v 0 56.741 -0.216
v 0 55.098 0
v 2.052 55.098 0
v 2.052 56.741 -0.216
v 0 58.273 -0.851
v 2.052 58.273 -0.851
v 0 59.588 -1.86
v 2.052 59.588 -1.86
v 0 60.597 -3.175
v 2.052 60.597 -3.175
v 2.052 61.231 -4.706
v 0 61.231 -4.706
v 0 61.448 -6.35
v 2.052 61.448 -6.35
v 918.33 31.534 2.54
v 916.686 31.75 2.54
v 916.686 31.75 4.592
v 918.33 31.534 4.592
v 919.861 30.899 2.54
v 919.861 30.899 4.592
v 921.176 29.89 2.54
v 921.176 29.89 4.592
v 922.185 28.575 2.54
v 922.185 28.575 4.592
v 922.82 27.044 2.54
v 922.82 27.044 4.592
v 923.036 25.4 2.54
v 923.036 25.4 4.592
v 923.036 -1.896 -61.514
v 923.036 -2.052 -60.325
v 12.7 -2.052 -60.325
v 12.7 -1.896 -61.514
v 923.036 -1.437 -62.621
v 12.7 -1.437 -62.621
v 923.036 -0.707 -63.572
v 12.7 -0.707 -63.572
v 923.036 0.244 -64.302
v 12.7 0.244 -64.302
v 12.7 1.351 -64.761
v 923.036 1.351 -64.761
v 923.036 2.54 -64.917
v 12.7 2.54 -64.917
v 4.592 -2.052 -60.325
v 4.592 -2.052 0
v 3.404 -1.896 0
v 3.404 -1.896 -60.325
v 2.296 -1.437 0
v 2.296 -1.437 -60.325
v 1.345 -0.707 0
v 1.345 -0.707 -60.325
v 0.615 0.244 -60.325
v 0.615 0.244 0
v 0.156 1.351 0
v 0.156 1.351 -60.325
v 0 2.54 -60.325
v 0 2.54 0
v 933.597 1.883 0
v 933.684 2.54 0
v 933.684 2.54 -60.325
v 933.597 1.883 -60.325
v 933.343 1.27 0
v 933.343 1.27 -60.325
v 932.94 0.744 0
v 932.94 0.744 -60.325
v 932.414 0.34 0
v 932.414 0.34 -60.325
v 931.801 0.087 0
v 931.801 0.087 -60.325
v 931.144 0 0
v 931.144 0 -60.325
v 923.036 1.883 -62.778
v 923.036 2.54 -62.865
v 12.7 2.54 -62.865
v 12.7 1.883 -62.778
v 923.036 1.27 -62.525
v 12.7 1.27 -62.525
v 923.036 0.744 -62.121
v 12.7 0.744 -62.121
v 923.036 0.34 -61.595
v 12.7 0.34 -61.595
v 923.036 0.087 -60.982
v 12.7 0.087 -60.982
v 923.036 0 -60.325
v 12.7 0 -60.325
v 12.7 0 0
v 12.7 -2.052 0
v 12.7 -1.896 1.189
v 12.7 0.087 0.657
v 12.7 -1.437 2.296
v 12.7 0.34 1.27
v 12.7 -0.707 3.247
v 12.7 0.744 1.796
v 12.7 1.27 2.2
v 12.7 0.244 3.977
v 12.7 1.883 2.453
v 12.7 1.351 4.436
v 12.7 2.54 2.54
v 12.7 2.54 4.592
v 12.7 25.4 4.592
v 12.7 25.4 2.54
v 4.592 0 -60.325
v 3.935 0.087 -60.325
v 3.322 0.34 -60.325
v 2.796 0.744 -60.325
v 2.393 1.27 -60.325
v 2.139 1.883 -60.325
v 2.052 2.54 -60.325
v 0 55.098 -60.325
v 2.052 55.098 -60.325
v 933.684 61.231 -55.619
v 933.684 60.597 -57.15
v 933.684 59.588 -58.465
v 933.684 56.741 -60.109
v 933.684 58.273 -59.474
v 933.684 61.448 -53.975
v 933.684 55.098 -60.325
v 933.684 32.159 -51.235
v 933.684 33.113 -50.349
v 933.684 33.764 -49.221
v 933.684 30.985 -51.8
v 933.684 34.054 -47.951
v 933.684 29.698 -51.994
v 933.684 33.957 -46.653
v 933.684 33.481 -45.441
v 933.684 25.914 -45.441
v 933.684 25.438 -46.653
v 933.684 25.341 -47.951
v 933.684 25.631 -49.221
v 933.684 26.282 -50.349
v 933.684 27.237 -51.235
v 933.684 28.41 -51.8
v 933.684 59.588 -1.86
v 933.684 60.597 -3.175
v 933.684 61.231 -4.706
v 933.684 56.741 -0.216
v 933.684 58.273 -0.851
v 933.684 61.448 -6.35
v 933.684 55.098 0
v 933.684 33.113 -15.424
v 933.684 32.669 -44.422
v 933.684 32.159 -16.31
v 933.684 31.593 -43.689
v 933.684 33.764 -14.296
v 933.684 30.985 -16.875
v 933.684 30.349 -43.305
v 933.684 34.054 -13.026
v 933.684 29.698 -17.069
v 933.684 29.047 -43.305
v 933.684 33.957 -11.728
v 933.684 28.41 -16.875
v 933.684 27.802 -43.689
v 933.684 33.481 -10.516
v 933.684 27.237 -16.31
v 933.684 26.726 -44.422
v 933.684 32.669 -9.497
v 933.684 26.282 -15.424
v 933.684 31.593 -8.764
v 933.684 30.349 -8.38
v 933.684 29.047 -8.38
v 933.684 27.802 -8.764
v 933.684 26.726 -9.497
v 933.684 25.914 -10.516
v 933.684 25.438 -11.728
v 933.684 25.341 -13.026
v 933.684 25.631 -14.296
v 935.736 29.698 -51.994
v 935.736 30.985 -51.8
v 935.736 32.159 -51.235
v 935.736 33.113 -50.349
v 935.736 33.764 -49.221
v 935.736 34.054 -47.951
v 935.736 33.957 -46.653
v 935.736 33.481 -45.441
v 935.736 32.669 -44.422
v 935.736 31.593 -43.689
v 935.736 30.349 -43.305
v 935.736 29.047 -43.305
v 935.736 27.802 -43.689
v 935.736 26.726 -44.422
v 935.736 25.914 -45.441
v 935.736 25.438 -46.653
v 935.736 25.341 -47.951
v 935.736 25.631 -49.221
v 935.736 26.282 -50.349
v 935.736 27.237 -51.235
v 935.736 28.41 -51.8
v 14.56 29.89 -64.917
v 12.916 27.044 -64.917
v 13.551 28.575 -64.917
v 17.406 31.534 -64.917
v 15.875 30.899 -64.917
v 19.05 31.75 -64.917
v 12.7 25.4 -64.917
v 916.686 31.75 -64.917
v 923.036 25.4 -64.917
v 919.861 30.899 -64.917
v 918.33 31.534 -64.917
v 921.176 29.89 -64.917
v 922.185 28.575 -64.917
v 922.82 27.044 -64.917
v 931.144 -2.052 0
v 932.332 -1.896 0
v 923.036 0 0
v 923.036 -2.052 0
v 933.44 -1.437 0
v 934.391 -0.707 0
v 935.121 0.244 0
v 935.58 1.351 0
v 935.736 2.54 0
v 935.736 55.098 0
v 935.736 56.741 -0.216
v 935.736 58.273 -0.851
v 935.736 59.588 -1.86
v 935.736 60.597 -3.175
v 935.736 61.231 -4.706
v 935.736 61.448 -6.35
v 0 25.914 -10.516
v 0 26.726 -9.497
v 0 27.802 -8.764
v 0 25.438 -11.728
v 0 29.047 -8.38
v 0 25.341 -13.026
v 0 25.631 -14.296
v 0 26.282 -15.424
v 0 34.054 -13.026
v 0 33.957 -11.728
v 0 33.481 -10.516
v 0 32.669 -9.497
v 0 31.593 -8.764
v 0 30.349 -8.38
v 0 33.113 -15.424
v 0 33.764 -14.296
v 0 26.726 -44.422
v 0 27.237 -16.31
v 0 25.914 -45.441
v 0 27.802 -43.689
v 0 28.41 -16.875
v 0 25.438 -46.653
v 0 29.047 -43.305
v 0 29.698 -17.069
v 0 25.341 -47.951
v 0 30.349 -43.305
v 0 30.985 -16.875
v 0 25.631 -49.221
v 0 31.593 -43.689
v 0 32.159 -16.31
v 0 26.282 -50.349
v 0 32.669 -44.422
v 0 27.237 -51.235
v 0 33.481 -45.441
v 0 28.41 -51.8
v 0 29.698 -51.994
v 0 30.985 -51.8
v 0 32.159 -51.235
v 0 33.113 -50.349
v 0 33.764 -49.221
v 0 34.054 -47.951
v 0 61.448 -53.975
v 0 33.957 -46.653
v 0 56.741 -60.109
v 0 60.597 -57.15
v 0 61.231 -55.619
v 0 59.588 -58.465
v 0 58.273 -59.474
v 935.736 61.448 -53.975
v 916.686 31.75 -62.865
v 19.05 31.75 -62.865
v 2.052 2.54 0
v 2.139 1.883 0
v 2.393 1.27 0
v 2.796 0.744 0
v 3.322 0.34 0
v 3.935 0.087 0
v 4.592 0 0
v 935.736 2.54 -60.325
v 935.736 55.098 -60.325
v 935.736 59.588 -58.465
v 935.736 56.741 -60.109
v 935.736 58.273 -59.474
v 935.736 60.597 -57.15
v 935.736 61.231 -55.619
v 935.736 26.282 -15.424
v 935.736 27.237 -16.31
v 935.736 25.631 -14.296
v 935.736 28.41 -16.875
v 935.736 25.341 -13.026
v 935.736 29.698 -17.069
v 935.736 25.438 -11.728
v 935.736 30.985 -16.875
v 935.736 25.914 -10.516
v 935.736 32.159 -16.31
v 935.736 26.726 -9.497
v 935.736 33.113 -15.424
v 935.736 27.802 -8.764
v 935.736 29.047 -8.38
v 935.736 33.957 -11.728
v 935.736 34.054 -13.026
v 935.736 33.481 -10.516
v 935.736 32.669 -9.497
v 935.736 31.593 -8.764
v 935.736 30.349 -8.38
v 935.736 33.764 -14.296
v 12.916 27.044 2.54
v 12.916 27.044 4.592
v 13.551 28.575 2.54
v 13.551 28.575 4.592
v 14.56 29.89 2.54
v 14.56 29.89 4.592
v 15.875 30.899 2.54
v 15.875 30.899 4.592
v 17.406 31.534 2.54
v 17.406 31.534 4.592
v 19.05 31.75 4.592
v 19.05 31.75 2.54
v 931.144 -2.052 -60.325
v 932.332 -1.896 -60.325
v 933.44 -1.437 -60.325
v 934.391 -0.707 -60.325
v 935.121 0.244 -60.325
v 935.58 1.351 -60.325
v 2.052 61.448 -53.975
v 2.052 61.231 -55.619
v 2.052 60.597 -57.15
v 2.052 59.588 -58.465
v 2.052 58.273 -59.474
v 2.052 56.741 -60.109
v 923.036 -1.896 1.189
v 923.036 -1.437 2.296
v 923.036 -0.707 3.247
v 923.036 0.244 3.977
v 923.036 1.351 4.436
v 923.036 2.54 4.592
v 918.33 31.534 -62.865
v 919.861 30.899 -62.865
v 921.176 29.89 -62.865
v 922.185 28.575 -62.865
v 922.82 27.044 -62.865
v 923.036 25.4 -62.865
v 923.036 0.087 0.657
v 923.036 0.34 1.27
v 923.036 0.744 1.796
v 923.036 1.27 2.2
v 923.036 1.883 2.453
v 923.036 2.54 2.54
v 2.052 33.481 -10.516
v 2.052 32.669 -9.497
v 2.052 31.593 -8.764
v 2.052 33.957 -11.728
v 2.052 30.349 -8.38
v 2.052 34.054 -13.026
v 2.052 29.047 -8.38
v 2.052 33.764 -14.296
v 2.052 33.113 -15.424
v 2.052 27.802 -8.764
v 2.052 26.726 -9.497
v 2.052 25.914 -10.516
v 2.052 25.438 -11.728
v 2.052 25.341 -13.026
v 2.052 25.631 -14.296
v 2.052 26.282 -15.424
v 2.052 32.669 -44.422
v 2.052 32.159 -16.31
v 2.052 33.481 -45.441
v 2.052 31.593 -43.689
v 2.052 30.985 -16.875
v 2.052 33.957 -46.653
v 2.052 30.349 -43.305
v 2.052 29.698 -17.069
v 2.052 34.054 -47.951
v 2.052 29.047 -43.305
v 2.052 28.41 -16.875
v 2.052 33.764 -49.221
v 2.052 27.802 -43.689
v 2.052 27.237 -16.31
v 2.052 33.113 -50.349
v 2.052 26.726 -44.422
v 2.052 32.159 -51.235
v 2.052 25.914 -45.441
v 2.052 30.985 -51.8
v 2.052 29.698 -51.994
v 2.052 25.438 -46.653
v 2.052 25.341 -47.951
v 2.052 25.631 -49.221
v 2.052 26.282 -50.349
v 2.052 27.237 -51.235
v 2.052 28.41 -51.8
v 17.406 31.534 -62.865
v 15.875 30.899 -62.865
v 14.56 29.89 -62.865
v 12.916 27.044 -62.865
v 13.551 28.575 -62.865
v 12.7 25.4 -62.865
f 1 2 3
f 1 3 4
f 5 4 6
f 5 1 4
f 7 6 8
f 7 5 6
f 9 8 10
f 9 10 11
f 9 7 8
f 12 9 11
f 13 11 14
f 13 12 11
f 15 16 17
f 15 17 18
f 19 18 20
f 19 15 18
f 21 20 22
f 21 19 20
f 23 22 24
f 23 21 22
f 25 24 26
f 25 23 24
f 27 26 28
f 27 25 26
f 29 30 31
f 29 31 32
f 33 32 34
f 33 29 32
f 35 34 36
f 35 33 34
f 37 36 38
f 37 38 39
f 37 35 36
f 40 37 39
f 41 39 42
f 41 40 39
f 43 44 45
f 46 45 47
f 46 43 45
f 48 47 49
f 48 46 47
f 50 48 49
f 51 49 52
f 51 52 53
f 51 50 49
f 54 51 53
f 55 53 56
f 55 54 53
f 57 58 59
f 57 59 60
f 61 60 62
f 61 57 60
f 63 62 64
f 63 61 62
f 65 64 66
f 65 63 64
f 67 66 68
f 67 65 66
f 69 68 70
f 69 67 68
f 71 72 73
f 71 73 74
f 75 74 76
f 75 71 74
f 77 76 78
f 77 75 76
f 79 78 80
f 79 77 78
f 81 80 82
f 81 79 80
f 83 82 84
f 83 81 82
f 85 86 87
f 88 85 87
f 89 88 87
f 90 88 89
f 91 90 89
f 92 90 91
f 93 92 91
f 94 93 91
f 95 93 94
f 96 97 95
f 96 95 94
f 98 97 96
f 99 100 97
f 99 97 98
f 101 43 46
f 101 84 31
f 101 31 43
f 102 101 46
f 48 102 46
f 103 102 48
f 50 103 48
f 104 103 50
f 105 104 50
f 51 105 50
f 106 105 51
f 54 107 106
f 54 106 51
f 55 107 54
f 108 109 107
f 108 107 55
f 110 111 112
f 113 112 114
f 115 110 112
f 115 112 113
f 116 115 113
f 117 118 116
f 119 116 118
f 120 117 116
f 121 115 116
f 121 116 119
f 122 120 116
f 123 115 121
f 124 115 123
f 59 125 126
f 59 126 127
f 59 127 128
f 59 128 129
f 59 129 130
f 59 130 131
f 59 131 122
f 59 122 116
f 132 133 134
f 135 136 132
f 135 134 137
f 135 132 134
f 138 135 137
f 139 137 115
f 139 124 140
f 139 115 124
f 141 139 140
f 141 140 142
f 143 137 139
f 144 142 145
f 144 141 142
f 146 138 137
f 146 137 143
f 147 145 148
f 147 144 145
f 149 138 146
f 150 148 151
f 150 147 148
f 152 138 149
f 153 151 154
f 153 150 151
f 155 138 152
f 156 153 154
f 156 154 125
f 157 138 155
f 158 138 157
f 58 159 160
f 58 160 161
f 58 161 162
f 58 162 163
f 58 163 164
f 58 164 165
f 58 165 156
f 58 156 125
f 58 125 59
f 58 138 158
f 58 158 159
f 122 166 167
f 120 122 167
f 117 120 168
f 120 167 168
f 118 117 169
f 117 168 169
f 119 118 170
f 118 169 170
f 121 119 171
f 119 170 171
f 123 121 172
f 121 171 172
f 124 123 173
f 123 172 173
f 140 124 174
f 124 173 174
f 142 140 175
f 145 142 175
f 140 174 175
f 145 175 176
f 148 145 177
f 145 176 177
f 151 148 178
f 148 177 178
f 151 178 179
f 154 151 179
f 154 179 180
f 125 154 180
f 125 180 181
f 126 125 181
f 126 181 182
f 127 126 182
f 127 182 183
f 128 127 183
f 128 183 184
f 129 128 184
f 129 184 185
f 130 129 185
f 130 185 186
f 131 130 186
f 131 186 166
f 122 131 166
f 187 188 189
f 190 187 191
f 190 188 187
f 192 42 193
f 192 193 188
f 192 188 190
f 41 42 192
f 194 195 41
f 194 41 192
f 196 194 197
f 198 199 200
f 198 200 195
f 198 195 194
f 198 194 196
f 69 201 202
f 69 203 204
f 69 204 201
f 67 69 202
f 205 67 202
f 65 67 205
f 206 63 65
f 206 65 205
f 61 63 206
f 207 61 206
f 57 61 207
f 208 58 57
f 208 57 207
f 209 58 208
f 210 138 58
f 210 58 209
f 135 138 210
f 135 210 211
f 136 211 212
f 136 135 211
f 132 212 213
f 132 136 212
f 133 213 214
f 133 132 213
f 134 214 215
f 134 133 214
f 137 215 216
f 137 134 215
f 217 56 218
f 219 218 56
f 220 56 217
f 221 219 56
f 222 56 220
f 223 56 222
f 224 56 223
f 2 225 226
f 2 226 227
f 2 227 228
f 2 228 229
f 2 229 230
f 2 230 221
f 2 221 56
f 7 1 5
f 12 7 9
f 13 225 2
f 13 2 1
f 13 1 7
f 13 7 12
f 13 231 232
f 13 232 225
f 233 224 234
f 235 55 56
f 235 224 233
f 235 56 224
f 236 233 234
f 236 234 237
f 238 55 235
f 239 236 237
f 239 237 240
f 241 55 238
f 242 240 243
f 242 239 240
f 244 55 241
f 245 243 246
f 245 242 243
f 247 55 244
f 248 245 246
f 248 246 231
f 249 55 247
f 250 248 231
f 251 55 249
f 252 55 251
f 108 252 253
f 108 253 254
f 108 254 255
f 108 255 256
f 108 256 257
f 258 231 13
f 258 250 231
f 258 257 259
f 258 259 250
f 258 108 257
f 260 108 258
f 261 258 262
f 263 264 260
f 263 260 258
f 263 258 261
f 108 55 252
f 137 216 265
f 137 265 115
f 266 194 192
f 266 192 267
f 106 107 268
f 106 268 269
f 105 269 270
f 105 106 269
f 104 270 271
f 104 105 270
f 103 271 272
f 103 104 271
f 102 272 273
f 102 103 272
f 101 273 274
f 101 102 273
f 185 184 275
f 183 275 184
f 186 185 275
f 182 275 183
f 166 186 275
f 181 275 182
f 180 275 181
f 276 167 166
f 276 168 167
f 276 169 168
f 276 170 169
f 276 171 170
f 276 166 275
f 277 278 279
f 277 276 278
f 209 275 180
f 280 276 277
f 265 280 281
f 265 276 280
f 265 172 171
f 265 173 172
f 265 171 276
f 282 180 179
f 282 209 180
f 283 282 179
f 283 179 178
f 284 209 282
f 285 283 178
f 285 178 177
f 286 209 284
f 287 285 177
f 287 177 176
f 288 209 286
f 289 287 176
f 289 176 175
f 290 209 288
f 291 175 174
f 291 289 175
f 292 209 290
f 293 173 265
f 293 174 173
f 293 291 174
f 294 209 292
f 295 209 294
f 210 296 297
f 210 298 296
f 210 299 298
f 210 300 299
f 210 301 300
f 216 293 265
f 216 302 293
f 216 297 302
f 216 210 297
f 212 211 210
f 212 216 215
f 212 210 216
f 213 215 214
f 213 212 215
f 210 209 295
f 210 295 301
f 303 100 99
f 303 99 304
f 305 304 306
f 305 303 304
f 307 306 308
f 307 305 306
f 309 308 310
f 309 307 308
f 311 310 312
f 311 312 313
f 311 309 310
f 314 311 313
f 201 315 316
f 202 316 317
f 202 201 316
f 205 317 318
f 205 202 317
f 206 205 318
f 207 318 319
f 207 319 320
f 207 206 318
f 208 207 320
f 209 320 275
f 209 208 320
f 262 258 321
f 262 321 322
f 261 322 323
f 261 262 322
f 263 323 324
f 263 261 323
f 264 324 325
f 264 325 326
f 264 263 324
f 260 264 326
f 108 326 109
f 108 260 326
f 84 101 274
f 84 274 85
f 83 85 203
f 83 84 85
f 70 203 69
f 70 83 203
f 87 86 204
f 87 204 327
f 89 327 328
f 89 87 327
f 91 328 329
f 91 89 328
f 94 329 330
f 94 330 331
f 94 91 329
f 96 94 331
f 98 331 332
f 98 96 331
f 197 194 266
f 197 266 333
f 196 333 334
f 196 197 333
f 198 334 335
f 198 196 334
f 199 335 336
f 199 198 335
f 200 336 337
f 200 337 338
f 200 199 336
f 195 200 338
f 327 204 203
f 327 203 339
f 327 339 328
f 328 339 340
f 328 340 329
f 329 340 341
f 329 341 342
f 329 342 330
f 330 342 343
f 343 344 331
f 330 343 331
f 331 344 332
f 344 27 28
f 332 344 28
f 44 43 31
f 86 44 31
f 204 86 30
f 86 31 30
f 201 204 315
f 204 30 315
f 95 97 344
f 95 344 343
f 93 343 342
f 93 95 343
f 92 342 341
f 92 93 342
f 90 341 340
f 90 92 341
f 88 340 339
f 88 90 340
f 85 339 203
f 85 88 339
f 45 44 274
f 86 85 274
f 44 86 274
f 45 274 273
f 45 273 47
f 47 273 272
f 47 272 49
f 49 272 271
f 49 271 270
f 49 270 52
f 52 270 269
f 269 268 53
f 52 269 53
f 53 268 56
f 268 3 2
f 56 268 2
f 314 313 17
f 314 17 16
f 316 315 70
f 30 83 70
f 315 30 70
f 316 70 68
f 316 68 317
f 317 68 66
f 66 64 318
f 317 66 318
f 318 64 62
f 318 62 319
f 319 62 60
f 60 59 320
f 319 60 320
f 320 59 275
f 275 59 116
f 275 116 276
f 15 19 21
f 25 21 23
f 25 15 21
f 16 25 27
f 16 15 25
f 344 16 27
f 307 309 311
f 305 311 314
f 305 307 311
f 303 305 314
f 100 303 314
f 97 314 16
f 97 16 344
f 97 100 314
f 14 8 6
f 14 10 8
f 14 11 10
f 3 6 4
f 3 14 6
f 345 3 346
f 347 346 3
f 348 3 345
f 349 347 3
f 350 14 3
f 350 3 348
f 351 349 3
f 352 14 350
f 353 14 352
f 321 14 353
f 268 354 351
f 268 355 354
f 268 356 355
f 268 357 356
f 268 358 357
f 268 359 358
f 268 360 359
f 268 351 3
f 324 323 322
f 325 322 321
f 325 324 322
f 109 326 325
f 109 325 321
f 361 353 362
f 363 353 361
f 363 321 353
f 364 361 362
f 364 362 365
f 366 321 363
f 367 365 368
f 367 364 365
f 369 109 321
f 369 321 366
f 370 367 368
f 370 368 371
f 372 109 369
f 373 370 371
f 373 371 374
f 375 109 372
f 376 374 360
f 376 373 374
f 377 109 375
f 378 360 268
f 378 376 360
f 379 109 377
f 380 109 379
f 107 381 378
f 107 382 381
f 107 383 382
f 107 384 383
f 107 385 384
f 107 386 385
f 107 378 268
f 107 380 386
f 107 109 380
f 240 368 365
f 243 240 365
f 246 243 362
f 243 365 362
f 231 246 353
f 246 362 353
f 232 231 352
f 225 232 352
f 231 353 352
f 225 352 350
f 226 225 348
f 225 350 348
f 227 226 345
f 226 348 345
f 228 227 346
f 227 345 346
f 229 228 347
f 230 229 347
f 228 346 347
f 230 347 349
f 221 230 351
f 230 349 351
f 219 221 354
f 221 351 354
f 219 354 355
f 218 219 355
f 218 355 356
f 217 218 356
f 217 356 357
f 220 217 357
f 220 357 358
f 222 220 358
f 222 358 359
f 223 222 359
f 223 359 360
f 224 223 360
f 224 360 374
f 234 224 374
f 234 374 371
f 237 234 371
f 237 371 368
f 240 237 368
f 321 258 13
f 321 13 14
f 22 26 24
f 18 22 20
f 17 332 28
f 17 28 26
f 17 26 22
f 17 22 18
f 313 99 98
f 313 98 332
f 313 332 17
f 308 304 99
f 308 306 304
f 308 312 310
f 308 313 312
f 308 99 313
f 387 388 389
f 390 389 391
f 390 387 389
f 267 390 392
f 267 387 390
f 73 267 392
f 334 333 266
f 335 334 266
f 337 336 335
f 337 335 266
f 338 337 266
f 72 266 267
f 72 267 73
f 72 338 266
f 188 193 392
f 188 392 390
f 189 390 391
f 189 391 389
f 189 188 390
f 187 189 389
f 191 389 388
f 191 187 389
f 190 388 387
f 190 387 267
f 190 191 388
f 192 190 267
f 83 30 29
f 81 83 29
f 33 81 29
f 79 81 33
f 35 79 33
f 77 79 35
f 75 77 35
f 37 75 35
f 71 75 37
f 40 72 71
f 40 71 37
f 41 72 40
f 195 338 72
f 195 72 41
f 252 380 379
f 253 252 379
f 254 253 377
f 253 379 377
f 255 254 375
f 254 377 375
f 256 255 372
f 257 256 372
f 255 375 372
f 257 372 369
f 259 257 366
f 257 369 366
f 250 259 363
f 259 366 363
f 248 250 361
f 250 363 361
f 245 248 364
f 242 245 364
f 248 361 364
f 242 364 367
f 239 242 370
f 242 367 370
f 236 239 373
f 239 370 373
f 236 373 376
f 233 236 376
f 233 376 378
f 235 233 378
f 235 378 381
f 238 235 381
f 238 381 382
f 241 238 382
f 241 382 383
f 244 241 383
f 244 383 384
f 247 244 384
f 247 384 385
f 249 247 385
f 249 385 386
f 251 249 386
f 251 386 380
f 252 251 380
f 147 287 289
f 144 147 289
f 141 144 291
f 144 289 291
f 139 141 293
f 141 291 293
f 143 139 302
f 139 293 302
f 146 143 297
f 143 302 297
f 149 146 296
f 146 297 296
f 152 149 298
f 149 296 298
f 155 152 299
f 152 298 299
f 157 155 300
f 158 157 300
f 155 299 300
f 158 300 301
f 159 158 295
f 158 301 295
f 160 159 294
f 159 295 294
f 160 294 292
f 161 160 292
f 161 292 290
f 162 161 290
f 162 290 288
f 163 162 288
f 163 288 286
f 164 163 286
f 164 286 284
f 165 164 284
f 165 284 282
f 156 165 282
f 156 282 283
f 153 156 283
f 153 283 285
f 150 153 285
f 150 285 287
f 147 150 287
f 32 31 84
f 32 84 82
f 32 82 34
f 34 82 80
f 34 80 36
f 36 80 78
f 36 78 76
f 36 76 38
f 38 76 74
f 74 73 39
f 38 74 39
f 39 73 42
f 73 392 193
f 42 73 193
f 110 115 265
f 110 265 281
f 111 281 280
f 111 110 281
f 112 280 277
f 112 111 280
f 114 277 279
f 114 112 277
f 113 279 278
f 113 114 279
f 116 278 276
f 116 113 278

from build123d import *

# Parameters (mm, degrees)
SKETCH1_W                                 = 935.736
SKETCH1_H                                 = 60.325
BASE_FLANGE1_DEPTH                        = 2.05232
EDGE_FLANGE1_DEPTH                        = 910.336
EDGE_FLANGE1_BEND_DEPTH                   = 910.336
EDGE_FLANGE2_STRIP_W                      = 13.28928
EDGE_FLANGE2_STRIP_H                      = 2.05232
EDGE_FLANGE2_STRIP_CUT_DEPTH              = 60.325
EDGE_FLANGE2_STRIP_2_W                    = 13.28928
EDGE_FLANGE2_STRIP_2_H                    = 2.05232
EDGE_FLANGE2_STRIP_CUT_2_DEPTH            = 60.325
EDGE_FLANGE2_DEPTH                        = 60.325
EDGE_FLANGE2_BEND_DEPTH                   = 60.325
HOLE_FOR_1_4_SELF_CLINCHING_NUTS_S_SS_C_D = 8.7376
BREAK_CORNER1_DEPTH                       = 935.736
BREAK_CORNER1_START                       = -64.91732
BREAK_CORNER1_2_DEPTH                     = 69.50964


# Read off the part's stored shape, not the designer's step: Break-Corner1
# Sheet-metal steps are written as plain solids
with BuildPart() as part:
    # Sketch1 → Base-Flange1 (new body)
    with BuildSketch(Plane(origin=(0, 0, 0), x_dir=(1, 0, 0), z_dir=(0, 1, 0))):
        with Locations((467.868, 30.1625)):
            Rectangle(SKETCH1_W, SKETCH1_H)
    extrude(amount=-BASE_FLANGE1_DEPTH)

    # Edge-Flange1 section (across the edge) → Edge-Flange1 (add)
    with BuildSketch(Plane(origin=(923.036, 0, -62.865), x_dir=(0, 0, 1), z_dir=(-1, 0, 0))):
        with BuildLine():
            Line((-2.05232, 2.54), (-2.05232, 31.75))
            Line((-2.05232, 31.75), (0, 31.75))
            Line((0, 31.75), (0, 2.54))
            ThreePointArc((0, 2.54), (0.743948776, 0.743948776), (2.54, 0))
            Line((2.54, 0), (2.54, -2.05232))
            ThreePointArc((2.54, -2.05232), (-0.707260613, -0.707260613), (-2.05232, 2.54))
        make_face()
    extrude(amount=EDGE_FLANGE1_DEPTH)

    # Edge-Flange1 section 2 (across the edge) → Edge-Flange1 bend (add)
    with BuildSketch(Plane(origin=(12.7, 0, 2.54), x_dir=(0, 0, -1), z_dir=(1, 0, 0))):
        with BuildLine():
            Line((-2.05232, 2.54), (-2.05232, 31.75))
            Line((-2.05232, 31.75), (0, 31.75))
            Line((0, 31.75), (0, 2.54))
            ThreePointArc((0, 2.54), (0.743948776, 0.743948776), (2.54, 0))
            Line((2.54, 0), (2.54, -2.05232))
            ThreePointArc((2.54, -2.05232), (-0.707260613, -0.707260613), (-2.05232, 2.54))
        make_face()
    extrude(amount=EDGE_FLANGE1_BEND_DEPTH)

    # Edge-Flange2 strip (across the edge) → Edge-Flange2 strip cut (cut)
    with BuildSketch(Plane.XY.offset(-60.325)):
        with Locations((-2.05232, -1.02616)):
            Rectangle(EDGE_FLANGE2_STRIP_W, EDGE_FLANGE2_STRIP_H)
    extrude(amount=EDGE_FLANGE2_STRIP_CUT_DEPTH, mode=Mode.SUBTRACT)

    # Edge-Flange2 strip 2 (across the edge) → Edge-Flange2 strip cut 2 (cut)
    with BuildSketch(Plane(origin=(935.736, 0, 0), x_dir=(-1, 0, 0), z_dir=(0, 0, -1))):
        with Locations((-2.05232, -1.02616)):
            Rectangle(EDGE_FLANGE2_STRIP_2_W, EDGE_FLANGE2_STRIP_2_H)
    extrude(amount=EDGE_FLANGE2_STRIP_CUT_2_DEPTH, mode=Mode.SUBTRACT)

    # Edge-Flange2 section (across the edge) → Edge-Flange2 (add)
    with BuildSketch(Plane.XY.offset(-60.325)):
        with BuildLine():
            Line((0, 2.54), (0, 61.44768))
            Line((0, 61.44768), (2.05232, 61.44768))
            Line((2.05232, 61.44768), (2.05232, 2.54))
            ThreePointArc((2.05232, 2.54), (2.796268776, 0.743948776), (4.59232, 0))
            Line((4.59232, 0), (4.59232, -2.05232))
            ThreePointArc((4.59232, -2.05232), (1.345059387, -0.707260613), (0, 2.54))
        make_face()
    extrude(amount=EDGE_FLANGE2_DEPTH)

    # Edge-Flange2 section 2 (across the edge) → Edge-Flange2 bend (add)
    with BuildSketch(Plane(origin=(935.736, 0, 0), x_dir=(-1, 0, 0), z_dir=(0, 0, -1))):
        with BuildLine():
            Line((0, 2.54), (0, 61.44768))
            Line((0, 61.44768), (2.05232, 61.44768))
            Line((2.05232, 61.44768), (2.05232, 2.54))
            ThreePointArc((2.05232, 2.54), (2.796268776, 0.743948776), (4.59232, 0))
            Line((4.59232, 0), (4.59232, -2.05232))
            ThreePointArc((4.59232, -2.05232), (1.345059387, -0.707260613), (0, 2.54))
        make_face()
    extrude(amount=EDGE_FLANGE2_BEND_DEPTH)

    # Hole for 1/4 Self-clinching Nuts (S,SS,CLS,CLSS)1 (through all)
    with Locations(Plane.ZY):
        with Locations((-47.625, 29.69768), (-12.7, 29.69768)):
            Hole(HOLE_FOR_1_4_SELF_CLINCHING_NUTS_S_SS_C_D / 2)

    # Break-Corner1 outline → Break-Corner1 (cut)
    with BuildSketch(Plane.YZ):
        with BuildLine():
            ThreePointArc((55.09768, 0), (59.587808061, -1.859871939), (61.44768, -6.35))
            Line((61.44768, -6.35), (61.44768, 0))
            Line((61.44768, 0), (55.09768, 0))
        make_face()
        with BuildLine():
            Line((61.44768, -60.325), (61.44768, -53.975))
            ThreePointArc((61.44768, -53.975), (59.587808061, -58.465128061), (55.09768, -60.325))
            Line((55.09768, -60.325), (61.44768, -60.325))
        make_face()
    extrude(amount=BREAK_CORNER1_DEPTH, mode=Mode.SUBTRACT)

    # Break-Corner1 2 outline → Break-Corner1 2 (cut)
    with BuildSketch(Plane.XY.offset(BREAK_CORNER1_START)):
        with BuildLine():
            Line((12.7, 31.75), (12.7, 25.4))
            ThreePointArc((12.7, 25.4), (14.559871939, 29.890128061), (19.05, 31.75))
            Line((19.05, 31.75), (12.7, 31.75))
        make_face()
        with BuildLine():
            Line((923.036, 31.75), (916.686, 31.75))
            ThreePointArc((916.686, 31.75), (921.176128061, 29.890128061), (923.036, 25.4))
            Line((923.036, 25.4), (923.036, 31.75))
        make_face()
    extrude(amount=BREAK_CORNER1_2_DEPTH, mode=Mode.SUBTRACT)


solid = part.part
